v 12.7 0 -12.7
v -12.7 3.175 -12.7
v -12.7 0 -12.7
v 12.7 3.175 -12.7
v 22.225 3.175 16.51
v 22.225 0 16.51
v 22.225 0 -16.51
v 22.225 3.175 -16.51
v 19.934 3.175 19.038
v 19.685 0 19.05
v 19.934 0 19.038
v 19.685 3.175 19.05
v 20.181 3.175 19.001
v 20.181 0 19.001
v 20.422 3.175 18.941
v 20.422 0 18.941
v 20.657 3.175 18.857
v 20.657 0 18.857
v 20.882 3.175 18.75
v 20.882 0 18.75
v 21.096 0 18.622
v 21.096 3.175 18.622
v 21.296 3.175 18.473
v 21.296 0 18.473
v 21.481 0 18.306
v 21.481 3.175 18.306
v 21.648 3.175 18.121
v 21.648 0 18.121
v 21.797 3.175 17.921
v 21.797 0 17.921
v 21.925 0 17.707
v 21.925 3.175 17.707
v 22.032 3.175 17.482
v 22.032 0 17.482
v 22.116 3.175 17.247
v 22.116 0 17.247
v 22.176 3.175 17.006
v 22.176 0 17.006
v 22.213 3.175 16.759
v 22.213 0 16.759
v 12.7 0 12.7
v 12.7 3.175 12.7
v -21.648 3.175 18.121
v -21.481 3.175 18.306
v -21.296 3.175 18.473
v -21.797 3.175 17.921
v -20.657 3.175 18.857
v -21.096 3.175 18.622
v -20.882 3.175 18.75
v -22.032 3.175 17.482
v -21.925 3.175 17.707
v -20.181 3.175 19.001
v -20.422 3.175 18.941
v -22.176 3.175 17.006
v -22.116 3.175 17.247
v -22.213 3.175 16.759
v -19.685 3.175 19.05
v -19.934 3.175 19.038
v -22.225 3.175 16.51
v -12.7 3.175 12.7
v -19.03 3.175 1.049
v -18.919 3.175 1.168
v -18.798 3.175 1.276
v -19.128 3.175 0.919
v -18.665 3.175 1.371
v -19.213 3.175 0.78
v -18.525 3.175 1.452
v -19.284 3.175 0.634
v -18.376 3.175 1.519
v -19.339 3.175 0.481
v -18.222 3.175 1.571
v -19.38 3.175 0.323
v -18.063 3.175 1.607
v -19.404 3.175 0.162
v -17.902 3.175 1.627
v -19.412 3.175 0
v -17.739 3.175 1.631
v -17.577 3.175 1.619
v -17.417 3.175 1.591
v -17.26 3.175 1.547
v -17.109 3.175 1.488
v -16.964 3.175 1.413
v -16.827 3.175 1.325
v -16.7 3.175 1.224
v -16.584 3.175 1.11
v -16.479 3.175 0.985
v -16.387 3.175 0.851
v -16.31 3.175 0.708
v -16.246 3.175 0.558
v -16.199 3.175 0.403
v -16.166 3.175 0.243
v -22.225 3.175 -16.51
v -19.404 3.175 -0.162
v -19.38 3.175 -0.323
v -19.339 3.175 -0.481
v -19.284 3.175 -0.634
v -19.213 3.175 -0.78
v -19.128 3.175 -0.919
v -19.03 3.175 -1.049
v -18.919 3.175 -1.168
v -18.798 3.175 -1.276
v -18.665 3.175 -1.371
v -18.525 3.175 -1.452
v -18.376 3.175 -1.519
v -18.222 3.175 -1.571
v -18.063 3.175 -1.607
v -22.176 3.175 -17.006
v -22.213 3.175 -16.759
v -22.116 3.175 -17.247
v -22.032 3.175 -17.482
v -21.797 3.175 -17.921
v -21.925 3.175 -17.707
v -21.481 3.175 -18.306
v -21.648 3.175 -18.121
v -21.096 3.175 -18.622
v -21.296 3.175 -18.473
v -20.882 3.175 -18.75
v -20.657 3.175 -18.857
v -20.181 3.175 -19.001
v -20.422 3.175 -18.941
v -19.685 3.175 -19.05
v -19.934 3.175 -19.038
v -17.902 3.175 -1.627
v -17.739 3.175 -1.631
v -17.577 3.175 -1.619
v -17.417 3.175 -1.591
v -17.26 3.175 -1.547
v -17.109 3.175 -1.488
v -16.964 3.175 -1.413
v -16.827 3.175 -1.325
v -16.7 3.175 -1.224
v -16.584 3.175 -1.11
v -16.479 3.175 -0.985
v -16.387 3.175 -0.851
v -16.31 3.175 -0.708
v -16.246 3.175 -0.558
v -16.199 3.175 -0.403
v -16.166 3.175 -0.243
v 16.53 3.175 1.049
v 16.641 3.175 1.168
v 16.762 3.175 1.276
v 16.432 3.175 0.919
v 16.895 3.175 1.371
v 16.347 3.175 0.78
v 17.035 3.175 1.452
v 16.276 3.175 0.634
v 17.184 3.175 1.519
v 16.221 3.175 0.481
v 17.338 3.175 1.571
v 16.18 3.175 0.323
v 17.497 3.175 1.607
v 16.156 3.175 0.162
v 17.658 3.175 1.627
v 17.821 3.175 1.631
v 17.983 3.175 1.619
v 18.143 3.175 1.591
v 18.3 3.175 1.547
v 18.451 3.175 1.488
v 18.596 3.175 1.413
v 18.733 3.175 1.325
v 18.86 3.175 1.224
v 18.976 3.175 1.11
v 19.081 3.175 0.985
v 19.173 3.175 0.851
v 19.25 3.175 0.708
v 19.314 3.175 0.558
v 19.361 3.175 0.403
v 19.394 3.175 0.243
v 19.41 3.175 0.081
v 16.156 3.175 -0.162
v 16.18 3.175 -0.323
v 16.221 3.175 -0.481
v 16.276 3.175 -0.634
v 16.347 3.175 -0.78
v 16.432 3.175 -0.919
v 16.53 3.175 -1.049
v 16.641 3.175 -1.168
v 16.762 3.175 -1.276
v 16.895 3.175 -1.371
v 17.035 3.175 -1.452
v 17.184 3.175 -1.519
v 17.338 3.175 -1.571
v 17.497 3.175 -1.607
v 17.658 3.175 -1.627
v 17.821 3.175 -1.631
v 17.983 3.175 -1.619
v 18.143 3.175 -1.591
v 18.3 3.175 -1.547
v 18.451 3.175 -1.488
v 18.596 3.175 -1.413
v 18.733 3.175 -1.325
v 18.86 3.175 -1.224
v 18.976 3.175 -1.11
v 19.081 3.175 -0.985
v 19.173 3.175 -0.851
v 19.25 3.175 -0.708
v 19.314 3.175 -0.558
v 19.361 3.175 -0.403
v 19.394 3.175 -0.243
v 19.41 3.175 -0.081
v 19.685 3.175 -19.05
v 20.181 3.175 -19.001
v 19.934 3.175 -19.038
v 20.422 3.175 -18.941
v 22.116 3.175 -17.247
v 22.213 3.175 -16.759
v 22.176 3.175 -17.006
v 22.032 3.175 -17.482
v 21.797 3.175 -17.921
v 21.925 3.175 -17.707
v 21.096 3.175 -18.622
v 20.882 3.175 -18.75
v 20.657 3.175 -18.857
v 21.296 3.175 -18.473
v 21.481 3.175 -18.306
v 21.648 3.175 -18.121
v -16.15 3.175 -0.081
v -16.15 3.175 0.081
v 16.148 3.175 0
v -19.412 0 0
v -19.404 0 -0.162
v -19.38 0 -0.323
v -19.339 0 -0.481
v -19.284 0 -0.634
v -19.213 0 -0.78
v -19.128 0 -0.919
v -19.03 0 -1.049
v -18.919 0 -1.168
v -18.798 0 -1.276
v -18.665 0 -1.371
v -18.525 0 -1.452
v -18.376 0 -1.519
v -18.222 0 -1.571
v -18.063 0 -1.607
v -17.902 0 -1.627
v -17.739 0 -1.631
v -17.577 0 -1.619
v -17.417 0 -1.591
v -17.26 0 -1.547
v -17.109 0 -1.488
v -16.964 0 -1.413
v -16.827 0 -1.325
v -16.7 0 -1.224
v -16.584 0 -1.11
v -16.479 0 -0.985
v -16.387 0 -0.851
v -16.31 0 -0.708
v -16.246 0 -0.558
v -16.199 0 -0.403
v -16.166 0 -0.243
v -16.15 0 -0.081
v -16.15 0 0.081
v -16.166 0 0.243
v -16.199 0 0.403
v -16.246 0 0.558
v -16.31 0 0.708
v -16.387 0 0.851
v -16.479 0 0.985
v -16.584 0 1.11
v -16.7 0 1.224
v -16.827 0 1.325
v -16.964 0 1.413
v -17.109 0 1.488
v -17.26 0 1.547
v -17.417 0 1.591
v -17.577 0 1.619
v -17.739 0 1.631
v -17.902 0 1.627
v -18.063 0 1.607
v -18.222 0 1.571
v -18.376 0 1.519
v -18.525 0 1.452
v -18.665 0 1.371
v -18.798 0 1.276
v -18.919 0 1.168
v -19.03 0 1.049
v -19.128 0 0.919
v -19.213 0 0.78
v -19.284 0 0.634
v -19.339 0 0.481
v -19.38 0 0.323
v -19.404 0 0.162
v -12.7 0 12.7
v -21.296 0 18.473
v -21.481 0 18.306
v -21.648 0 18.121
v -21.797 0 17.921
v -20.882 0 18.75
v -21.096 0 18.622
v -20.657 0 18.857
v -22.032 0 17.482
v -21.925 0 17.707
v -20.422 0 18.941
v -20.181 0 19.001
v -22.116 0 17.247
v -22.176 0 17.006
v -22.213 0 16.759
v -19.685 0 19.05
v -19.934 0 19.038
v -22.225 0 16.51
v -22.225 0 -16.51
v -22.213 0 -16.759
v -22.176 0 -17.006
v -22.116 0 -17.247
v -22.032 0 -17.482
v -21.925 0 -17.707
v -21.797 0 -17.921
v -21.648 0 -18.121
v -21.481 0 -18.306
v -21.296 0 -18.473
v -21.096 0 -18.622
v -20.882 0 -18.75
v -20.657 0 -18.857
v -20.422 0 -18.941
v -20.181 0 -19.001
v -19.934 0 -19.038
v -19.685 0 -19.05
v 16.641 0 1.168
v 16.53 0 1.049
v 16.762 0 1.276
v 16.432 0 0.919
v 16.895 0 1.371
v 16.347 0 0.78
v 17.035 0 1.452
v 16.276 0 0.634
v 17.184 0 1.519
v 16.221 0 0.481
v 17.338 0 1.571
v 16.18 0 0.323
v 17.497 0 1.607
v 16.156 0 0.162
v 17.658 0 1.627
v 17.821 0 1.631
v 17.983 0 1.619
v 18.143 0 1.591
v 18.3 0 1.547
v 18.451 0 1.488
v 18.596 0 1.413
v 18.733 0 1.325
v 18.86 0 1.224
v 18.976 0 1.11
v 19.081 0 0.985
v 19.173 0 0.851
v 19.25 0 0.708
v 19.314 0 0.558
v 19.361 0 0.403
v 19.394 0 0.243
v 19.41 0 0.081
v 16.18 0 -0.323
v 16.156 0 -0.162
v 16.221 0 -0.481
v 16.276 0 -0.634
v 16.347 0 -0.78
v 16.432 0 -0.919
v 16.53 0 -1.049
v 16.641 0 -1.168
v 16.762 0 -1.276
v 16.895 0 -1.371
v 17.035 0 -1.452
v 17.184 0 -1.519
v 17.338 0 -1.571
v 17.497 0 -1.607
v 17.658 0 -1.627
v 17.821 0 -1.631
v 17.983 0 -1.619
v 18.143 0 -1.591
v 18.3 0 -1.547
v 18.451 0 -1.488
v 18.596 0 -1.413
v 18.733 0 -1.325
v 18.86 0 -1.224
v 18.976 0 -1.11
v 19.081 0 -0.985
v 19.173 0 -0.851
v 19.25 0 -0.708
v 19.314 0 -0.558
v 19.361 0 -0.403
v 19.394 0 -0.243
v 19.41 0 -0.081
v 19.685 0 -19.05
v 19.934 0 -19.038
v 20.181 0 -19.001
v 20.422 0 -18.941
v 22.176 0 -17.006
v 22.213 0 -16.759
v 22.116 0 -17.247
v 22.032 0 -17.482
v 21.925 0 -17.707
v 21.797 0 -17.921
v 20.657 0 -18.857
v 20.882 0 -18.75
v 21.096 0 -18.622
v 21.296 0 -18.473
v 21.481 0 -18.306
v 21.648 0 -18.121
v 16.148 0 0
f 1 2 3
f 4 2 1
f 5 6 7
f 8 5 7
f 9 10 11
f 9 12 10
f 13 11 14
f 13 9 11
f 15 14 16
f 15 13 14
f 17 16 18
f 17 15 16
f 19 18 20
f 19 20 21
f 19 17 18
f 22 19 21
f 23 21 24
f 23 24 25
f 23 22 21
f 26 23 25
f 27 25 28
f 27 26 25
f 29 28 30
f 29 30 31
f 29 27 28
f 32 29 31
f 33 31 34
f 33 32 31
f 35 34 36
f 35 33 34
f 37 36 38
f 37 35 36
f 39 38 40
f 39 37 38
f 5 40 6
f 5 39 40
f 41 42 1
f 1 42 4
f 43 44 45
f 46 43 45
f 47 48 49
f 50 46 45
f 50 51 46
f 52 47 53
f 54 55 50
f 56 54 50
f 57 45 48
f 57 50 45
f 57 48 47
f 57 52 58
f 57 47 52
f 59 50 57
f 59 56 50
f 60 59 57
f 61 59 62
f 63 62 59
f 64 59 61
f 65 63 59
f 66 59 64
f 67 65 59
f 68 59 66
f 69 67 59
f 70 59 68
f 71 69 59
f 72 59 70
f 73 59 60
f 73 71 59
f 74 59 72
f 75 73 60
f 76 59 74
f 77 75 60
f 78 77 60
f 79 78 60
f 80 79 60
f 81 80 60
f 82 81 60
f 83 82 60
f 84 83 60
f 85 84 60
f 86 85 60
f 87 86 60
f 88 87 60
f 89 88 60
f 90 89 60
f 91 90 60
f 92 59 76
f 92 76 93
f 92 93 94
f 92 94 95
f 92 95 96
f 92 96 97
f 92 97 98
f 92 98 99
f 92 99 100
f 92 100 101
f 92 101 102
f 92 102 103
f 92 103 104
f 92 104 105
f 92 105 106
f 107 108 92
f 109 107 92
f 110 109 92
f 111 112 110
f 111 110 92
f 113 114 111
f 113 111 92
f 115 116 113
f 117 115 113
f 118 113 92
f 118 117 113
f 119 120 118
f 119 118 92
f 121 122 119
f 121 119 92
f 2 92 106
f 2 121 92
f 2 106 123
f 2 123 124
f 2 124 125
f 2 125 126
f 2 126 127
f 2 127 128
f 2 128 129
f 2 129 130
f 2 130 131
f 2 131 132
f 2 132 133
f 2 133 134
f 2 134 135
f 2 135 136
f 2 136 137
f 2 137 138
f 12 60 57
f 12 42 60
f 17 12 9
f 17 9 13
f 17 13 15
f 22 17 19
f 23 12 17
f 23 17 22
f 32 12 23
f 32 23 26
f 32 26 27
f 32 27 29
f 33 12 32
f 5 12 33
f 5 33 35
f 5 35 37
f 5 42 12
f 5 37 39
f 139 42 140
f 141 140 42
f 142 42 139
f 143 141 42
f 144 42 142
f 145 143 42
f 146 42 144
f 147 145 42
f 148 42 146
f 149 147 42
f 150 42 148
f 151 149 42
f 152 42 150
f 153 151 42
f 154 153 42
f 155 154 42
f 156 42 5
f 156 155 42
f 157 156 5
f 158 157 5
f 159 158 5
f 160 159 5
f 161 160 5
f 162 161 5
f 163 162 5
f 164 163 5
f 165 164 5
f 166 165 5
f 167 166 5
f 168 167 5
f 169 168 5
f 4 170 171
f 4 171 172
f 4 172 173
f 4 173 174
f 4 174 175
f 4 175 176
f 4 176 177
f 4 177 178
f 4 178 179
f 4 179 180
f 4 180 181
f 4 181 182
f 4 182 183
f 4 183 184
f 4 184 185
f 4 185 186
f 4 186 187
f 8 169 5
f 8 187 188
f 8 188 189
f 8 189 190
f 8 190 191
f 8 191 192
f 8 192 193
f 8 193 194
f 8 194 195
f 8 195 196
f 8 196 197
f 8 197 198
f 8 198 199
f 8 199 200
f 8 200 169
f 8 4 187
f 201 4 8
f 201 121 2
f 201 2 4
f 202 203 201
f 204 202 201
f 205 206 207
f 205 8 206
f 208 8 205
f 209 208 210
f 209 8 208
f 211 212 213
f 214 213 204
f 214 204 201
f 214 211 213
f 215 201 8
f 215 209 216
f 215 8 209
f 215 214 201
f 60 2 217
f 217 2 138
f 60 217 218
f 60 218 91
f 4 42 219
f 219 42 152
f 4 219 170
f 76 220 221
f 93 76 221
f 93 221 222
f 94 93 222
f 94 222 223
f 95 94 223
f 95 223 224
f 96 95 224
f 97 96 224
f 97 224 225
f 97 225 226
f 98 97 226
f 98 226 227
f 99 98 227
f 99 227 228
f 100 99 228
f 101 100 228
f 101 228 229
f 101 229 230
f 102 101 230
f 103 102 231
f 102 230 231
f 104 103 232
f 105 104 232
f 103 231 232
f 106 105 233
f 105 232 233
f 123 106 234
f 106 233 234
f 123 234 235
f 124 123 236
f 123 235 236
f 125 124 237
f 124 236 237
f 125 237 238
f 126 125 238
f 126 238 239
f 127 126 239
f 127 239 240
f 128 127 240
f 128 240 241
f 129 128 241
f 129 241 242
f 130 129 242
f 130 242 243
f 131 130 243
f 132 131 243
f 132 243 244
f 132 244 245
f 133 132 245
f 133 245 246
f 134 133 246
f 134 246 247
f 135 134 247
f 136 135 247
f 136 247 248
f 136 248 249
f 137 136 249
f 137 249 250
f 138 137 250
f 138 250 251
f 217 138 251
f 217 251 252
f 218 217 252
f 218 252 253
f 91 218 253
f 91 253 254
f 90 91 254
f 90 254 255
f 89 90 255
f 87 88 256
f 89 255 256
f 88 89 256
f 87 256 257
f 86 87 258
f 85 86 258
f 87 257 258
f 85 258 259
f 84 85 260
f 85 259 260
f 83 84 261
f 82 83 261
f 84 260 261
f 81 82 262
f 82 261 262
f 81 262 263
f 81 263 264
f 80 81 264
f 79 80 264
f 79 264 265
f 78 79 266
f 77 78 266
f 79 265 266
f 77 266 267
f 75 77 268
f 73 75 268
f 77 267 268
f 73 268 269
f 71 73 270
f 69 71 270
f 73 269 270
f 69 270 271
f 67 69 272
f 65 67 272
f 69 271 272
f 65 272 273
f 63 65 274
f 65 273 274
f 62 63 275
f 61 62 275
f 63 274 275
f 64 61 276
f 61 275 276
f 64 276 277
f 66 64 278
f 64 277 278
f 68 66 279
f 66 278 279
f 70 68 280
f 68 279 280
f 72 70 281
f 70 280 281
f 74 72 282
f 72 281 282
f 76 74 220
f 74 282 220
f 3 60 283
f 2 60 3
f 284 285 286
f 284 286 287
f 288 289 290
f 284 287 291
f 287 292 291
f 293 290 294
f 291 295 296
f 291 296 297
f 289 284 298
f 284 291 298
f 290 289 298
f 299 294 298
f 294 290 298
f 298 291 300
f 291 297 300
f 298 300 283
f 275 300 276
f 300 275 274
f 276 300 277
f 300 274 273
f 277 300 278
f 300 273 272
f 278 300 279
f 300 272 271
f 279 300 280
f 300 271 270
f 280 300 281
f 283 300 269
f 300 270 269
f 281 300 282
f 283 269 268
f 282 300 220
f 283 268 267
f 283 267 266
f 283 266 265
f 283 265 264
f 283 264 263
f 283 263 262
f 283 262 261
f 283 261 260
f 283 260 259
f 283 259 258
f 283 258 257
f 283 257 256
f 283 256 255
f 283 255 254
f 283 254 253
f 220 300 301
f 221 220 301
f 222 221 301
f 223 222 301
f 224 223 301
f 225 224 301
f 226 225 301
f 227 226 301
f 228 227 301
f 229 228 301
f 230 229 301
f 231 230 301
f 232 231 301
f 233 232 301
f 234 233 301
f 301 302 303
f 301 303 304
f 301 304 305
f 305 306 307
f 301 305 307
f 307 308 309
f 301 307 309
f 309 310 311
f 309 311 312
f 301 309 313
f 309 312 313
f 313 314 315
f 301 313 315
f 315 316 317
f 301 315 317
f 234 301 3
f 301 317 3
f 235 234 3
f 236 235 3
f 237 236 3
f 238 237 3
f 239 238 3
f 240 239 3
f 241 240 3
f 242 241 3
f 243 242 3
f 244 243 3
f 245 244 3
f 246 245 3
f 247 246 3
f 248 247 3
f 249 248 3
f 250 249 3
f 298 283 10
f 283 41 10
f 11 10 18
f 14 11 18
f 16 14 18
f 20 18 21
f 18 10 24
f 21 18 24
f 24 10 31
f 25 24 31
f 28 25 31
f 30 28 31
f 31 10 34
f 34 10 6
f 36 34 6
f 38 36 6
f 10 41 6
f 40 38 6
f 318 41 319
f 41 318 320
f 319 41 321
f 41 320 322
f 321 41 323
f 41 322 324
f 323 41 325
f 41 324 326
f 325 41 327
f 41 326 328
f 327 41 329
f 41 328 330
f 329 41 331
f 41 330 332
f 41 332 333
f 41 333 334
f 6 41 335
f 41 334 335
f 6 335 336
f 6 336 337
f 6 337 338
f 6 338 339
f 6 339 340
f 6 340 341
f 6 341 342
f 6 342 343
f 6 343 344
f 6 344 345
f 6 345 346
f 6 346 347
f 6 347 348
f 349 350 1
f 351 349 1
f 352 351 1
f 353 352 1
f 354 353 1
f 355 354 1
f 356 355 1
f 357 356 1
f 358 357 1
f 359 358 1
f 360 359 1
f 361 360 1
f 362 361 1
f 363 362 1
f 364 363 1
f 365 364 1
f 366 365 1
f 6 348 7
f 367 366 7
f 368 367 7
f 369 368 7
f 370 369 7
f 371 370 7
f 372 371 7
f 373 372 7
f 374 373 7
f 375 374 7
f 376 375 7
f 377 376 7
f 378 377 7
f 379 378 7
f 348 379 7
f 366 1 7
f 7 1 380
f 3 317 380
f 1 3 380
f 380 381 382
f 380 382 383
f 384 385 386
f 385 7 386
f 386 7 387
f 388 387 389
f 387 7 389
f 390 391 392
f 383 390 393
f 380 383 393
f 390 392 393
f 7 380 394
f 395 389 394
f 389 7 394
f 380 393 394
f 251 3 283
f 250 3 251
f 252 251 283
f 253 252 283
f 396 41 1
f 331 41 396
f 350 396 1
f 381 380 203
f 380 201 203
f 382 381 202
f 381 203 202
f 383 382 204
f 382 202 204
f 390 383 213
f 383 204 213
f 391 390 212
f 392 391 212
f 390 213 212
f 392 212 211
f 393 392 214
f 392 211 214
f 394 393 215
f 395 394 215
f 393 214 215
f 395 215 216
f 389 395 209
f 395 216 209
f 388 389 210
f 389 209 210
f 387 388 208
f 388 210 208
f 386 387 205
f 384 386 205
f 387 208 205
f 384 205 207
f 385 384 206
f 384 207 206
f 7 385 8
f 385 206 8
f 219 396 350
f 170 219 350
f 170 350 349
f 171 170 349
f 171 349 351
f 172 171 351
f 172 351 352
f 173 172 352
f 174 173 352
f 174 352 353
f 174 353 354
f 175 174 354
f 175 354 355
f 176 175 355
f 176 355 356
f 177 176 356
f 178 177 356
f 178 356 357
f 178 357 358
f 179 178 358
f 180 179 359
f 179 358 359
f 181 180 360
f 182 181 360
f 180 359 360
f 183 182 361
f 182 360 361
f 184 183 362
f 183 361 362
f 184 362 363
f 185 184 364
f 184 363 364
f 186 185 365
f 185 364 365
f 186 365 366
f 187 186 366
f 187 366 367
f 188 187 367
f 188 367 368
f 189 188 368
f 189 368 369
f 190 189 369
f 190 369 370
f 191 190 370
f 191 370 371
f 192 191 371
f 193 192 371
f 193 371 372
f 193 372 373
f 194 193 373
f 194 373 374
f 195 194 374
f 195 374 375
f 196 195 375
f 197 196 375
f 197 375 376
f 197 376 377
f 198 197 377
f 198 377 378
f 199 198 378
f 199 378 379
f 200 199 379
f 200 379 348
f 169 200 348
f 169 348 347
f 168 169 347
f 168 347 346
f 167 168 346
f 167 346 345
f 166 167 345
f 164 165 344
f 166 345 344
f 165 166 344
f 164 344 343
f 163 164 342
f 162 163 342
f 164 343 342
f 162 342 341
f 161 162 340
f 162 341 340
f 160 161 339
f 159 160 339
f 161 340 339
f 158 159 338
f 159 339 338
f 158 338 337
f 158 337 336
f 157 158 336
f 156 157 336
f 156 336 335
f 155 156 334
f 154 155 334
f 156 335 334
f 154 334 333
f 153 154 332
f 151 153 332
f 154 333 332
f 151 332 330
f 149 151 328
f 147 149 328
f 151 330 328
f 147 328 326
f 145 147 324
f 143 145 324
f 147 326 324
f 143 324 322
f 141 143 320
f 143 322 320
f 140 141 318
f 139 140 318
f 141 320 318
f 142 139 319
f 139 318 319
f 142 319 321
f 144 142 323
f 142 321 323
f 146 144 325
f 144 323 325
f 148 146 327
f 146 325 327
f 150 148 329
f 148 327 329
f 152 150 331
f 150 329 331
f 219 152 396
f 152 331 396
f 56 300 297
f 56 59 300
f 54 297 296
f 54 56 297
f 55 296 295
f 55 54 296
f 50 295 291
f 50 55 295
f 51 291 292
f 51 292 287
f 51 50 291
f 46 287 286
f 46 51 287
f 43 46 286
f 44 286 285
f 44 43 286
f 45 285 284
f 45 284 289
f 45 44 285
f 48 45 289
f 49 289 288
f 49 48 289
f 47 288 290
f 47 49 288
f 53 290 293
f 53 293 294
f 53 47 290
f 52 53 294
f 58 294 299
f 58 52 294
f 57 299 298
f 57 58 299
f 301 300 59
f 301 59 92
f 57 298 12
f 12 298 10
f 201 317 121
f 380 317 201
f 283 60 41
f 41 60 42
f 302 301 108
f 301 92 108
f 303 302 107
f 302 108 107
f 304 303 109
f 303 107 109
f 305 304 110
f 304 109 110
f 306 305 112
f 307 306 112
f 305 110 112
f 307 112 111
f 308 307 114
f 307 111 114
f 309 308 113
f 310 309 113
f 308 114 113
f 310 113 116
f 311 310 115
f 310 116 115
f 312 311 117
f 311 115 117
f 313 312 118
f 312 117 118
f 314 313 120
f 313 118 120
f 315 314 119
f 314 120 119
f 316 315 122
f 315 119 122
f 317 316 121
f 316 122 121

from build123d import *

# Parameters (mm, degrees)
SKETCH1_W                 = 44.45
SKETCH1_H                 = 38.1
BOSS_EXTRUDE1_DEPTH       = 3.175
SKETCH2_W                 = 25.4
SKETCH2_H                 = 25.4
CUT_EXTRUDE1_DEPTH        = 3.175
F_4_CLEARANCE_HOLE1_D     = 3.2639
F_4_CLEARANCE_HOLE1_DEPTH = 10.16
F_4_CLEARANCE_HOLE1_TIP   = 0.980574487
FILLET1_R                 = 2.54


with BuildPart() as part:
    # Sketch1 → Boss-Extrude1 (new body)
    with BuildSketch(Plane(origin=(0, 0, 0), x_dir=(1, 0, 0), z_dir=(0, 1, 0))):
        Rectangle(SKETCH1_W, SKETCH1_H)
    extrude(amount=BOSS_EXTRUDE1_DEPTH)

    # Sketch2 → Cut-Extrude1 (cut)
    with BuildSketch(Plane(origin=(0, 3.175, 0), x_dir=(1, 0, 0), z_dir=(0, 1, 0))):
        Rectangle(SKETCH2_W, SKETCH2_H)
    extrude(amount=-CUT_EXTRUDE1_DEPTH, mode=Mode.SUBTRACT)

    # #4 Clearance Hole1
    with Locations(Plane(origin=(0, 3.175, 0), x_dir=(1, 0, 0), z_dir=(0, 1, 0))):
        with Locations((-17.78, 0), (17.78, 0)):
            Hole(F_4_CLEARANCE_HOLE1_D / 2, depth=F_4_CLEARANCE_HOLE1_DEPTH)
            with Locations((0, 0, -(F_4_CLEARANCE_HOLE1_DEPTH + F_4_CLEARANCE_HOLE1_TIP / 2))):  # 118° drill point
                Cone(0, F_4_CLEARANCE_HOLE1_D / 2, F_4_CLEARANCE_HOLE1_TIP, mode=Mode.SUBTRACT)

    # Fillet1
    fillet1_edges = [part.edges().sort_by_distance(p)[0] for p in [
        (22.225, 1.5875, 19.05),
        (-22.225, 1.5875, 19.05),
        (-22.225, 1.5875, -19.05),
        (22.225, 1.5875, -19.05),
    ]]
    fillet(fillet1_edges, radius=FILLET1_R)


solid = part.part
